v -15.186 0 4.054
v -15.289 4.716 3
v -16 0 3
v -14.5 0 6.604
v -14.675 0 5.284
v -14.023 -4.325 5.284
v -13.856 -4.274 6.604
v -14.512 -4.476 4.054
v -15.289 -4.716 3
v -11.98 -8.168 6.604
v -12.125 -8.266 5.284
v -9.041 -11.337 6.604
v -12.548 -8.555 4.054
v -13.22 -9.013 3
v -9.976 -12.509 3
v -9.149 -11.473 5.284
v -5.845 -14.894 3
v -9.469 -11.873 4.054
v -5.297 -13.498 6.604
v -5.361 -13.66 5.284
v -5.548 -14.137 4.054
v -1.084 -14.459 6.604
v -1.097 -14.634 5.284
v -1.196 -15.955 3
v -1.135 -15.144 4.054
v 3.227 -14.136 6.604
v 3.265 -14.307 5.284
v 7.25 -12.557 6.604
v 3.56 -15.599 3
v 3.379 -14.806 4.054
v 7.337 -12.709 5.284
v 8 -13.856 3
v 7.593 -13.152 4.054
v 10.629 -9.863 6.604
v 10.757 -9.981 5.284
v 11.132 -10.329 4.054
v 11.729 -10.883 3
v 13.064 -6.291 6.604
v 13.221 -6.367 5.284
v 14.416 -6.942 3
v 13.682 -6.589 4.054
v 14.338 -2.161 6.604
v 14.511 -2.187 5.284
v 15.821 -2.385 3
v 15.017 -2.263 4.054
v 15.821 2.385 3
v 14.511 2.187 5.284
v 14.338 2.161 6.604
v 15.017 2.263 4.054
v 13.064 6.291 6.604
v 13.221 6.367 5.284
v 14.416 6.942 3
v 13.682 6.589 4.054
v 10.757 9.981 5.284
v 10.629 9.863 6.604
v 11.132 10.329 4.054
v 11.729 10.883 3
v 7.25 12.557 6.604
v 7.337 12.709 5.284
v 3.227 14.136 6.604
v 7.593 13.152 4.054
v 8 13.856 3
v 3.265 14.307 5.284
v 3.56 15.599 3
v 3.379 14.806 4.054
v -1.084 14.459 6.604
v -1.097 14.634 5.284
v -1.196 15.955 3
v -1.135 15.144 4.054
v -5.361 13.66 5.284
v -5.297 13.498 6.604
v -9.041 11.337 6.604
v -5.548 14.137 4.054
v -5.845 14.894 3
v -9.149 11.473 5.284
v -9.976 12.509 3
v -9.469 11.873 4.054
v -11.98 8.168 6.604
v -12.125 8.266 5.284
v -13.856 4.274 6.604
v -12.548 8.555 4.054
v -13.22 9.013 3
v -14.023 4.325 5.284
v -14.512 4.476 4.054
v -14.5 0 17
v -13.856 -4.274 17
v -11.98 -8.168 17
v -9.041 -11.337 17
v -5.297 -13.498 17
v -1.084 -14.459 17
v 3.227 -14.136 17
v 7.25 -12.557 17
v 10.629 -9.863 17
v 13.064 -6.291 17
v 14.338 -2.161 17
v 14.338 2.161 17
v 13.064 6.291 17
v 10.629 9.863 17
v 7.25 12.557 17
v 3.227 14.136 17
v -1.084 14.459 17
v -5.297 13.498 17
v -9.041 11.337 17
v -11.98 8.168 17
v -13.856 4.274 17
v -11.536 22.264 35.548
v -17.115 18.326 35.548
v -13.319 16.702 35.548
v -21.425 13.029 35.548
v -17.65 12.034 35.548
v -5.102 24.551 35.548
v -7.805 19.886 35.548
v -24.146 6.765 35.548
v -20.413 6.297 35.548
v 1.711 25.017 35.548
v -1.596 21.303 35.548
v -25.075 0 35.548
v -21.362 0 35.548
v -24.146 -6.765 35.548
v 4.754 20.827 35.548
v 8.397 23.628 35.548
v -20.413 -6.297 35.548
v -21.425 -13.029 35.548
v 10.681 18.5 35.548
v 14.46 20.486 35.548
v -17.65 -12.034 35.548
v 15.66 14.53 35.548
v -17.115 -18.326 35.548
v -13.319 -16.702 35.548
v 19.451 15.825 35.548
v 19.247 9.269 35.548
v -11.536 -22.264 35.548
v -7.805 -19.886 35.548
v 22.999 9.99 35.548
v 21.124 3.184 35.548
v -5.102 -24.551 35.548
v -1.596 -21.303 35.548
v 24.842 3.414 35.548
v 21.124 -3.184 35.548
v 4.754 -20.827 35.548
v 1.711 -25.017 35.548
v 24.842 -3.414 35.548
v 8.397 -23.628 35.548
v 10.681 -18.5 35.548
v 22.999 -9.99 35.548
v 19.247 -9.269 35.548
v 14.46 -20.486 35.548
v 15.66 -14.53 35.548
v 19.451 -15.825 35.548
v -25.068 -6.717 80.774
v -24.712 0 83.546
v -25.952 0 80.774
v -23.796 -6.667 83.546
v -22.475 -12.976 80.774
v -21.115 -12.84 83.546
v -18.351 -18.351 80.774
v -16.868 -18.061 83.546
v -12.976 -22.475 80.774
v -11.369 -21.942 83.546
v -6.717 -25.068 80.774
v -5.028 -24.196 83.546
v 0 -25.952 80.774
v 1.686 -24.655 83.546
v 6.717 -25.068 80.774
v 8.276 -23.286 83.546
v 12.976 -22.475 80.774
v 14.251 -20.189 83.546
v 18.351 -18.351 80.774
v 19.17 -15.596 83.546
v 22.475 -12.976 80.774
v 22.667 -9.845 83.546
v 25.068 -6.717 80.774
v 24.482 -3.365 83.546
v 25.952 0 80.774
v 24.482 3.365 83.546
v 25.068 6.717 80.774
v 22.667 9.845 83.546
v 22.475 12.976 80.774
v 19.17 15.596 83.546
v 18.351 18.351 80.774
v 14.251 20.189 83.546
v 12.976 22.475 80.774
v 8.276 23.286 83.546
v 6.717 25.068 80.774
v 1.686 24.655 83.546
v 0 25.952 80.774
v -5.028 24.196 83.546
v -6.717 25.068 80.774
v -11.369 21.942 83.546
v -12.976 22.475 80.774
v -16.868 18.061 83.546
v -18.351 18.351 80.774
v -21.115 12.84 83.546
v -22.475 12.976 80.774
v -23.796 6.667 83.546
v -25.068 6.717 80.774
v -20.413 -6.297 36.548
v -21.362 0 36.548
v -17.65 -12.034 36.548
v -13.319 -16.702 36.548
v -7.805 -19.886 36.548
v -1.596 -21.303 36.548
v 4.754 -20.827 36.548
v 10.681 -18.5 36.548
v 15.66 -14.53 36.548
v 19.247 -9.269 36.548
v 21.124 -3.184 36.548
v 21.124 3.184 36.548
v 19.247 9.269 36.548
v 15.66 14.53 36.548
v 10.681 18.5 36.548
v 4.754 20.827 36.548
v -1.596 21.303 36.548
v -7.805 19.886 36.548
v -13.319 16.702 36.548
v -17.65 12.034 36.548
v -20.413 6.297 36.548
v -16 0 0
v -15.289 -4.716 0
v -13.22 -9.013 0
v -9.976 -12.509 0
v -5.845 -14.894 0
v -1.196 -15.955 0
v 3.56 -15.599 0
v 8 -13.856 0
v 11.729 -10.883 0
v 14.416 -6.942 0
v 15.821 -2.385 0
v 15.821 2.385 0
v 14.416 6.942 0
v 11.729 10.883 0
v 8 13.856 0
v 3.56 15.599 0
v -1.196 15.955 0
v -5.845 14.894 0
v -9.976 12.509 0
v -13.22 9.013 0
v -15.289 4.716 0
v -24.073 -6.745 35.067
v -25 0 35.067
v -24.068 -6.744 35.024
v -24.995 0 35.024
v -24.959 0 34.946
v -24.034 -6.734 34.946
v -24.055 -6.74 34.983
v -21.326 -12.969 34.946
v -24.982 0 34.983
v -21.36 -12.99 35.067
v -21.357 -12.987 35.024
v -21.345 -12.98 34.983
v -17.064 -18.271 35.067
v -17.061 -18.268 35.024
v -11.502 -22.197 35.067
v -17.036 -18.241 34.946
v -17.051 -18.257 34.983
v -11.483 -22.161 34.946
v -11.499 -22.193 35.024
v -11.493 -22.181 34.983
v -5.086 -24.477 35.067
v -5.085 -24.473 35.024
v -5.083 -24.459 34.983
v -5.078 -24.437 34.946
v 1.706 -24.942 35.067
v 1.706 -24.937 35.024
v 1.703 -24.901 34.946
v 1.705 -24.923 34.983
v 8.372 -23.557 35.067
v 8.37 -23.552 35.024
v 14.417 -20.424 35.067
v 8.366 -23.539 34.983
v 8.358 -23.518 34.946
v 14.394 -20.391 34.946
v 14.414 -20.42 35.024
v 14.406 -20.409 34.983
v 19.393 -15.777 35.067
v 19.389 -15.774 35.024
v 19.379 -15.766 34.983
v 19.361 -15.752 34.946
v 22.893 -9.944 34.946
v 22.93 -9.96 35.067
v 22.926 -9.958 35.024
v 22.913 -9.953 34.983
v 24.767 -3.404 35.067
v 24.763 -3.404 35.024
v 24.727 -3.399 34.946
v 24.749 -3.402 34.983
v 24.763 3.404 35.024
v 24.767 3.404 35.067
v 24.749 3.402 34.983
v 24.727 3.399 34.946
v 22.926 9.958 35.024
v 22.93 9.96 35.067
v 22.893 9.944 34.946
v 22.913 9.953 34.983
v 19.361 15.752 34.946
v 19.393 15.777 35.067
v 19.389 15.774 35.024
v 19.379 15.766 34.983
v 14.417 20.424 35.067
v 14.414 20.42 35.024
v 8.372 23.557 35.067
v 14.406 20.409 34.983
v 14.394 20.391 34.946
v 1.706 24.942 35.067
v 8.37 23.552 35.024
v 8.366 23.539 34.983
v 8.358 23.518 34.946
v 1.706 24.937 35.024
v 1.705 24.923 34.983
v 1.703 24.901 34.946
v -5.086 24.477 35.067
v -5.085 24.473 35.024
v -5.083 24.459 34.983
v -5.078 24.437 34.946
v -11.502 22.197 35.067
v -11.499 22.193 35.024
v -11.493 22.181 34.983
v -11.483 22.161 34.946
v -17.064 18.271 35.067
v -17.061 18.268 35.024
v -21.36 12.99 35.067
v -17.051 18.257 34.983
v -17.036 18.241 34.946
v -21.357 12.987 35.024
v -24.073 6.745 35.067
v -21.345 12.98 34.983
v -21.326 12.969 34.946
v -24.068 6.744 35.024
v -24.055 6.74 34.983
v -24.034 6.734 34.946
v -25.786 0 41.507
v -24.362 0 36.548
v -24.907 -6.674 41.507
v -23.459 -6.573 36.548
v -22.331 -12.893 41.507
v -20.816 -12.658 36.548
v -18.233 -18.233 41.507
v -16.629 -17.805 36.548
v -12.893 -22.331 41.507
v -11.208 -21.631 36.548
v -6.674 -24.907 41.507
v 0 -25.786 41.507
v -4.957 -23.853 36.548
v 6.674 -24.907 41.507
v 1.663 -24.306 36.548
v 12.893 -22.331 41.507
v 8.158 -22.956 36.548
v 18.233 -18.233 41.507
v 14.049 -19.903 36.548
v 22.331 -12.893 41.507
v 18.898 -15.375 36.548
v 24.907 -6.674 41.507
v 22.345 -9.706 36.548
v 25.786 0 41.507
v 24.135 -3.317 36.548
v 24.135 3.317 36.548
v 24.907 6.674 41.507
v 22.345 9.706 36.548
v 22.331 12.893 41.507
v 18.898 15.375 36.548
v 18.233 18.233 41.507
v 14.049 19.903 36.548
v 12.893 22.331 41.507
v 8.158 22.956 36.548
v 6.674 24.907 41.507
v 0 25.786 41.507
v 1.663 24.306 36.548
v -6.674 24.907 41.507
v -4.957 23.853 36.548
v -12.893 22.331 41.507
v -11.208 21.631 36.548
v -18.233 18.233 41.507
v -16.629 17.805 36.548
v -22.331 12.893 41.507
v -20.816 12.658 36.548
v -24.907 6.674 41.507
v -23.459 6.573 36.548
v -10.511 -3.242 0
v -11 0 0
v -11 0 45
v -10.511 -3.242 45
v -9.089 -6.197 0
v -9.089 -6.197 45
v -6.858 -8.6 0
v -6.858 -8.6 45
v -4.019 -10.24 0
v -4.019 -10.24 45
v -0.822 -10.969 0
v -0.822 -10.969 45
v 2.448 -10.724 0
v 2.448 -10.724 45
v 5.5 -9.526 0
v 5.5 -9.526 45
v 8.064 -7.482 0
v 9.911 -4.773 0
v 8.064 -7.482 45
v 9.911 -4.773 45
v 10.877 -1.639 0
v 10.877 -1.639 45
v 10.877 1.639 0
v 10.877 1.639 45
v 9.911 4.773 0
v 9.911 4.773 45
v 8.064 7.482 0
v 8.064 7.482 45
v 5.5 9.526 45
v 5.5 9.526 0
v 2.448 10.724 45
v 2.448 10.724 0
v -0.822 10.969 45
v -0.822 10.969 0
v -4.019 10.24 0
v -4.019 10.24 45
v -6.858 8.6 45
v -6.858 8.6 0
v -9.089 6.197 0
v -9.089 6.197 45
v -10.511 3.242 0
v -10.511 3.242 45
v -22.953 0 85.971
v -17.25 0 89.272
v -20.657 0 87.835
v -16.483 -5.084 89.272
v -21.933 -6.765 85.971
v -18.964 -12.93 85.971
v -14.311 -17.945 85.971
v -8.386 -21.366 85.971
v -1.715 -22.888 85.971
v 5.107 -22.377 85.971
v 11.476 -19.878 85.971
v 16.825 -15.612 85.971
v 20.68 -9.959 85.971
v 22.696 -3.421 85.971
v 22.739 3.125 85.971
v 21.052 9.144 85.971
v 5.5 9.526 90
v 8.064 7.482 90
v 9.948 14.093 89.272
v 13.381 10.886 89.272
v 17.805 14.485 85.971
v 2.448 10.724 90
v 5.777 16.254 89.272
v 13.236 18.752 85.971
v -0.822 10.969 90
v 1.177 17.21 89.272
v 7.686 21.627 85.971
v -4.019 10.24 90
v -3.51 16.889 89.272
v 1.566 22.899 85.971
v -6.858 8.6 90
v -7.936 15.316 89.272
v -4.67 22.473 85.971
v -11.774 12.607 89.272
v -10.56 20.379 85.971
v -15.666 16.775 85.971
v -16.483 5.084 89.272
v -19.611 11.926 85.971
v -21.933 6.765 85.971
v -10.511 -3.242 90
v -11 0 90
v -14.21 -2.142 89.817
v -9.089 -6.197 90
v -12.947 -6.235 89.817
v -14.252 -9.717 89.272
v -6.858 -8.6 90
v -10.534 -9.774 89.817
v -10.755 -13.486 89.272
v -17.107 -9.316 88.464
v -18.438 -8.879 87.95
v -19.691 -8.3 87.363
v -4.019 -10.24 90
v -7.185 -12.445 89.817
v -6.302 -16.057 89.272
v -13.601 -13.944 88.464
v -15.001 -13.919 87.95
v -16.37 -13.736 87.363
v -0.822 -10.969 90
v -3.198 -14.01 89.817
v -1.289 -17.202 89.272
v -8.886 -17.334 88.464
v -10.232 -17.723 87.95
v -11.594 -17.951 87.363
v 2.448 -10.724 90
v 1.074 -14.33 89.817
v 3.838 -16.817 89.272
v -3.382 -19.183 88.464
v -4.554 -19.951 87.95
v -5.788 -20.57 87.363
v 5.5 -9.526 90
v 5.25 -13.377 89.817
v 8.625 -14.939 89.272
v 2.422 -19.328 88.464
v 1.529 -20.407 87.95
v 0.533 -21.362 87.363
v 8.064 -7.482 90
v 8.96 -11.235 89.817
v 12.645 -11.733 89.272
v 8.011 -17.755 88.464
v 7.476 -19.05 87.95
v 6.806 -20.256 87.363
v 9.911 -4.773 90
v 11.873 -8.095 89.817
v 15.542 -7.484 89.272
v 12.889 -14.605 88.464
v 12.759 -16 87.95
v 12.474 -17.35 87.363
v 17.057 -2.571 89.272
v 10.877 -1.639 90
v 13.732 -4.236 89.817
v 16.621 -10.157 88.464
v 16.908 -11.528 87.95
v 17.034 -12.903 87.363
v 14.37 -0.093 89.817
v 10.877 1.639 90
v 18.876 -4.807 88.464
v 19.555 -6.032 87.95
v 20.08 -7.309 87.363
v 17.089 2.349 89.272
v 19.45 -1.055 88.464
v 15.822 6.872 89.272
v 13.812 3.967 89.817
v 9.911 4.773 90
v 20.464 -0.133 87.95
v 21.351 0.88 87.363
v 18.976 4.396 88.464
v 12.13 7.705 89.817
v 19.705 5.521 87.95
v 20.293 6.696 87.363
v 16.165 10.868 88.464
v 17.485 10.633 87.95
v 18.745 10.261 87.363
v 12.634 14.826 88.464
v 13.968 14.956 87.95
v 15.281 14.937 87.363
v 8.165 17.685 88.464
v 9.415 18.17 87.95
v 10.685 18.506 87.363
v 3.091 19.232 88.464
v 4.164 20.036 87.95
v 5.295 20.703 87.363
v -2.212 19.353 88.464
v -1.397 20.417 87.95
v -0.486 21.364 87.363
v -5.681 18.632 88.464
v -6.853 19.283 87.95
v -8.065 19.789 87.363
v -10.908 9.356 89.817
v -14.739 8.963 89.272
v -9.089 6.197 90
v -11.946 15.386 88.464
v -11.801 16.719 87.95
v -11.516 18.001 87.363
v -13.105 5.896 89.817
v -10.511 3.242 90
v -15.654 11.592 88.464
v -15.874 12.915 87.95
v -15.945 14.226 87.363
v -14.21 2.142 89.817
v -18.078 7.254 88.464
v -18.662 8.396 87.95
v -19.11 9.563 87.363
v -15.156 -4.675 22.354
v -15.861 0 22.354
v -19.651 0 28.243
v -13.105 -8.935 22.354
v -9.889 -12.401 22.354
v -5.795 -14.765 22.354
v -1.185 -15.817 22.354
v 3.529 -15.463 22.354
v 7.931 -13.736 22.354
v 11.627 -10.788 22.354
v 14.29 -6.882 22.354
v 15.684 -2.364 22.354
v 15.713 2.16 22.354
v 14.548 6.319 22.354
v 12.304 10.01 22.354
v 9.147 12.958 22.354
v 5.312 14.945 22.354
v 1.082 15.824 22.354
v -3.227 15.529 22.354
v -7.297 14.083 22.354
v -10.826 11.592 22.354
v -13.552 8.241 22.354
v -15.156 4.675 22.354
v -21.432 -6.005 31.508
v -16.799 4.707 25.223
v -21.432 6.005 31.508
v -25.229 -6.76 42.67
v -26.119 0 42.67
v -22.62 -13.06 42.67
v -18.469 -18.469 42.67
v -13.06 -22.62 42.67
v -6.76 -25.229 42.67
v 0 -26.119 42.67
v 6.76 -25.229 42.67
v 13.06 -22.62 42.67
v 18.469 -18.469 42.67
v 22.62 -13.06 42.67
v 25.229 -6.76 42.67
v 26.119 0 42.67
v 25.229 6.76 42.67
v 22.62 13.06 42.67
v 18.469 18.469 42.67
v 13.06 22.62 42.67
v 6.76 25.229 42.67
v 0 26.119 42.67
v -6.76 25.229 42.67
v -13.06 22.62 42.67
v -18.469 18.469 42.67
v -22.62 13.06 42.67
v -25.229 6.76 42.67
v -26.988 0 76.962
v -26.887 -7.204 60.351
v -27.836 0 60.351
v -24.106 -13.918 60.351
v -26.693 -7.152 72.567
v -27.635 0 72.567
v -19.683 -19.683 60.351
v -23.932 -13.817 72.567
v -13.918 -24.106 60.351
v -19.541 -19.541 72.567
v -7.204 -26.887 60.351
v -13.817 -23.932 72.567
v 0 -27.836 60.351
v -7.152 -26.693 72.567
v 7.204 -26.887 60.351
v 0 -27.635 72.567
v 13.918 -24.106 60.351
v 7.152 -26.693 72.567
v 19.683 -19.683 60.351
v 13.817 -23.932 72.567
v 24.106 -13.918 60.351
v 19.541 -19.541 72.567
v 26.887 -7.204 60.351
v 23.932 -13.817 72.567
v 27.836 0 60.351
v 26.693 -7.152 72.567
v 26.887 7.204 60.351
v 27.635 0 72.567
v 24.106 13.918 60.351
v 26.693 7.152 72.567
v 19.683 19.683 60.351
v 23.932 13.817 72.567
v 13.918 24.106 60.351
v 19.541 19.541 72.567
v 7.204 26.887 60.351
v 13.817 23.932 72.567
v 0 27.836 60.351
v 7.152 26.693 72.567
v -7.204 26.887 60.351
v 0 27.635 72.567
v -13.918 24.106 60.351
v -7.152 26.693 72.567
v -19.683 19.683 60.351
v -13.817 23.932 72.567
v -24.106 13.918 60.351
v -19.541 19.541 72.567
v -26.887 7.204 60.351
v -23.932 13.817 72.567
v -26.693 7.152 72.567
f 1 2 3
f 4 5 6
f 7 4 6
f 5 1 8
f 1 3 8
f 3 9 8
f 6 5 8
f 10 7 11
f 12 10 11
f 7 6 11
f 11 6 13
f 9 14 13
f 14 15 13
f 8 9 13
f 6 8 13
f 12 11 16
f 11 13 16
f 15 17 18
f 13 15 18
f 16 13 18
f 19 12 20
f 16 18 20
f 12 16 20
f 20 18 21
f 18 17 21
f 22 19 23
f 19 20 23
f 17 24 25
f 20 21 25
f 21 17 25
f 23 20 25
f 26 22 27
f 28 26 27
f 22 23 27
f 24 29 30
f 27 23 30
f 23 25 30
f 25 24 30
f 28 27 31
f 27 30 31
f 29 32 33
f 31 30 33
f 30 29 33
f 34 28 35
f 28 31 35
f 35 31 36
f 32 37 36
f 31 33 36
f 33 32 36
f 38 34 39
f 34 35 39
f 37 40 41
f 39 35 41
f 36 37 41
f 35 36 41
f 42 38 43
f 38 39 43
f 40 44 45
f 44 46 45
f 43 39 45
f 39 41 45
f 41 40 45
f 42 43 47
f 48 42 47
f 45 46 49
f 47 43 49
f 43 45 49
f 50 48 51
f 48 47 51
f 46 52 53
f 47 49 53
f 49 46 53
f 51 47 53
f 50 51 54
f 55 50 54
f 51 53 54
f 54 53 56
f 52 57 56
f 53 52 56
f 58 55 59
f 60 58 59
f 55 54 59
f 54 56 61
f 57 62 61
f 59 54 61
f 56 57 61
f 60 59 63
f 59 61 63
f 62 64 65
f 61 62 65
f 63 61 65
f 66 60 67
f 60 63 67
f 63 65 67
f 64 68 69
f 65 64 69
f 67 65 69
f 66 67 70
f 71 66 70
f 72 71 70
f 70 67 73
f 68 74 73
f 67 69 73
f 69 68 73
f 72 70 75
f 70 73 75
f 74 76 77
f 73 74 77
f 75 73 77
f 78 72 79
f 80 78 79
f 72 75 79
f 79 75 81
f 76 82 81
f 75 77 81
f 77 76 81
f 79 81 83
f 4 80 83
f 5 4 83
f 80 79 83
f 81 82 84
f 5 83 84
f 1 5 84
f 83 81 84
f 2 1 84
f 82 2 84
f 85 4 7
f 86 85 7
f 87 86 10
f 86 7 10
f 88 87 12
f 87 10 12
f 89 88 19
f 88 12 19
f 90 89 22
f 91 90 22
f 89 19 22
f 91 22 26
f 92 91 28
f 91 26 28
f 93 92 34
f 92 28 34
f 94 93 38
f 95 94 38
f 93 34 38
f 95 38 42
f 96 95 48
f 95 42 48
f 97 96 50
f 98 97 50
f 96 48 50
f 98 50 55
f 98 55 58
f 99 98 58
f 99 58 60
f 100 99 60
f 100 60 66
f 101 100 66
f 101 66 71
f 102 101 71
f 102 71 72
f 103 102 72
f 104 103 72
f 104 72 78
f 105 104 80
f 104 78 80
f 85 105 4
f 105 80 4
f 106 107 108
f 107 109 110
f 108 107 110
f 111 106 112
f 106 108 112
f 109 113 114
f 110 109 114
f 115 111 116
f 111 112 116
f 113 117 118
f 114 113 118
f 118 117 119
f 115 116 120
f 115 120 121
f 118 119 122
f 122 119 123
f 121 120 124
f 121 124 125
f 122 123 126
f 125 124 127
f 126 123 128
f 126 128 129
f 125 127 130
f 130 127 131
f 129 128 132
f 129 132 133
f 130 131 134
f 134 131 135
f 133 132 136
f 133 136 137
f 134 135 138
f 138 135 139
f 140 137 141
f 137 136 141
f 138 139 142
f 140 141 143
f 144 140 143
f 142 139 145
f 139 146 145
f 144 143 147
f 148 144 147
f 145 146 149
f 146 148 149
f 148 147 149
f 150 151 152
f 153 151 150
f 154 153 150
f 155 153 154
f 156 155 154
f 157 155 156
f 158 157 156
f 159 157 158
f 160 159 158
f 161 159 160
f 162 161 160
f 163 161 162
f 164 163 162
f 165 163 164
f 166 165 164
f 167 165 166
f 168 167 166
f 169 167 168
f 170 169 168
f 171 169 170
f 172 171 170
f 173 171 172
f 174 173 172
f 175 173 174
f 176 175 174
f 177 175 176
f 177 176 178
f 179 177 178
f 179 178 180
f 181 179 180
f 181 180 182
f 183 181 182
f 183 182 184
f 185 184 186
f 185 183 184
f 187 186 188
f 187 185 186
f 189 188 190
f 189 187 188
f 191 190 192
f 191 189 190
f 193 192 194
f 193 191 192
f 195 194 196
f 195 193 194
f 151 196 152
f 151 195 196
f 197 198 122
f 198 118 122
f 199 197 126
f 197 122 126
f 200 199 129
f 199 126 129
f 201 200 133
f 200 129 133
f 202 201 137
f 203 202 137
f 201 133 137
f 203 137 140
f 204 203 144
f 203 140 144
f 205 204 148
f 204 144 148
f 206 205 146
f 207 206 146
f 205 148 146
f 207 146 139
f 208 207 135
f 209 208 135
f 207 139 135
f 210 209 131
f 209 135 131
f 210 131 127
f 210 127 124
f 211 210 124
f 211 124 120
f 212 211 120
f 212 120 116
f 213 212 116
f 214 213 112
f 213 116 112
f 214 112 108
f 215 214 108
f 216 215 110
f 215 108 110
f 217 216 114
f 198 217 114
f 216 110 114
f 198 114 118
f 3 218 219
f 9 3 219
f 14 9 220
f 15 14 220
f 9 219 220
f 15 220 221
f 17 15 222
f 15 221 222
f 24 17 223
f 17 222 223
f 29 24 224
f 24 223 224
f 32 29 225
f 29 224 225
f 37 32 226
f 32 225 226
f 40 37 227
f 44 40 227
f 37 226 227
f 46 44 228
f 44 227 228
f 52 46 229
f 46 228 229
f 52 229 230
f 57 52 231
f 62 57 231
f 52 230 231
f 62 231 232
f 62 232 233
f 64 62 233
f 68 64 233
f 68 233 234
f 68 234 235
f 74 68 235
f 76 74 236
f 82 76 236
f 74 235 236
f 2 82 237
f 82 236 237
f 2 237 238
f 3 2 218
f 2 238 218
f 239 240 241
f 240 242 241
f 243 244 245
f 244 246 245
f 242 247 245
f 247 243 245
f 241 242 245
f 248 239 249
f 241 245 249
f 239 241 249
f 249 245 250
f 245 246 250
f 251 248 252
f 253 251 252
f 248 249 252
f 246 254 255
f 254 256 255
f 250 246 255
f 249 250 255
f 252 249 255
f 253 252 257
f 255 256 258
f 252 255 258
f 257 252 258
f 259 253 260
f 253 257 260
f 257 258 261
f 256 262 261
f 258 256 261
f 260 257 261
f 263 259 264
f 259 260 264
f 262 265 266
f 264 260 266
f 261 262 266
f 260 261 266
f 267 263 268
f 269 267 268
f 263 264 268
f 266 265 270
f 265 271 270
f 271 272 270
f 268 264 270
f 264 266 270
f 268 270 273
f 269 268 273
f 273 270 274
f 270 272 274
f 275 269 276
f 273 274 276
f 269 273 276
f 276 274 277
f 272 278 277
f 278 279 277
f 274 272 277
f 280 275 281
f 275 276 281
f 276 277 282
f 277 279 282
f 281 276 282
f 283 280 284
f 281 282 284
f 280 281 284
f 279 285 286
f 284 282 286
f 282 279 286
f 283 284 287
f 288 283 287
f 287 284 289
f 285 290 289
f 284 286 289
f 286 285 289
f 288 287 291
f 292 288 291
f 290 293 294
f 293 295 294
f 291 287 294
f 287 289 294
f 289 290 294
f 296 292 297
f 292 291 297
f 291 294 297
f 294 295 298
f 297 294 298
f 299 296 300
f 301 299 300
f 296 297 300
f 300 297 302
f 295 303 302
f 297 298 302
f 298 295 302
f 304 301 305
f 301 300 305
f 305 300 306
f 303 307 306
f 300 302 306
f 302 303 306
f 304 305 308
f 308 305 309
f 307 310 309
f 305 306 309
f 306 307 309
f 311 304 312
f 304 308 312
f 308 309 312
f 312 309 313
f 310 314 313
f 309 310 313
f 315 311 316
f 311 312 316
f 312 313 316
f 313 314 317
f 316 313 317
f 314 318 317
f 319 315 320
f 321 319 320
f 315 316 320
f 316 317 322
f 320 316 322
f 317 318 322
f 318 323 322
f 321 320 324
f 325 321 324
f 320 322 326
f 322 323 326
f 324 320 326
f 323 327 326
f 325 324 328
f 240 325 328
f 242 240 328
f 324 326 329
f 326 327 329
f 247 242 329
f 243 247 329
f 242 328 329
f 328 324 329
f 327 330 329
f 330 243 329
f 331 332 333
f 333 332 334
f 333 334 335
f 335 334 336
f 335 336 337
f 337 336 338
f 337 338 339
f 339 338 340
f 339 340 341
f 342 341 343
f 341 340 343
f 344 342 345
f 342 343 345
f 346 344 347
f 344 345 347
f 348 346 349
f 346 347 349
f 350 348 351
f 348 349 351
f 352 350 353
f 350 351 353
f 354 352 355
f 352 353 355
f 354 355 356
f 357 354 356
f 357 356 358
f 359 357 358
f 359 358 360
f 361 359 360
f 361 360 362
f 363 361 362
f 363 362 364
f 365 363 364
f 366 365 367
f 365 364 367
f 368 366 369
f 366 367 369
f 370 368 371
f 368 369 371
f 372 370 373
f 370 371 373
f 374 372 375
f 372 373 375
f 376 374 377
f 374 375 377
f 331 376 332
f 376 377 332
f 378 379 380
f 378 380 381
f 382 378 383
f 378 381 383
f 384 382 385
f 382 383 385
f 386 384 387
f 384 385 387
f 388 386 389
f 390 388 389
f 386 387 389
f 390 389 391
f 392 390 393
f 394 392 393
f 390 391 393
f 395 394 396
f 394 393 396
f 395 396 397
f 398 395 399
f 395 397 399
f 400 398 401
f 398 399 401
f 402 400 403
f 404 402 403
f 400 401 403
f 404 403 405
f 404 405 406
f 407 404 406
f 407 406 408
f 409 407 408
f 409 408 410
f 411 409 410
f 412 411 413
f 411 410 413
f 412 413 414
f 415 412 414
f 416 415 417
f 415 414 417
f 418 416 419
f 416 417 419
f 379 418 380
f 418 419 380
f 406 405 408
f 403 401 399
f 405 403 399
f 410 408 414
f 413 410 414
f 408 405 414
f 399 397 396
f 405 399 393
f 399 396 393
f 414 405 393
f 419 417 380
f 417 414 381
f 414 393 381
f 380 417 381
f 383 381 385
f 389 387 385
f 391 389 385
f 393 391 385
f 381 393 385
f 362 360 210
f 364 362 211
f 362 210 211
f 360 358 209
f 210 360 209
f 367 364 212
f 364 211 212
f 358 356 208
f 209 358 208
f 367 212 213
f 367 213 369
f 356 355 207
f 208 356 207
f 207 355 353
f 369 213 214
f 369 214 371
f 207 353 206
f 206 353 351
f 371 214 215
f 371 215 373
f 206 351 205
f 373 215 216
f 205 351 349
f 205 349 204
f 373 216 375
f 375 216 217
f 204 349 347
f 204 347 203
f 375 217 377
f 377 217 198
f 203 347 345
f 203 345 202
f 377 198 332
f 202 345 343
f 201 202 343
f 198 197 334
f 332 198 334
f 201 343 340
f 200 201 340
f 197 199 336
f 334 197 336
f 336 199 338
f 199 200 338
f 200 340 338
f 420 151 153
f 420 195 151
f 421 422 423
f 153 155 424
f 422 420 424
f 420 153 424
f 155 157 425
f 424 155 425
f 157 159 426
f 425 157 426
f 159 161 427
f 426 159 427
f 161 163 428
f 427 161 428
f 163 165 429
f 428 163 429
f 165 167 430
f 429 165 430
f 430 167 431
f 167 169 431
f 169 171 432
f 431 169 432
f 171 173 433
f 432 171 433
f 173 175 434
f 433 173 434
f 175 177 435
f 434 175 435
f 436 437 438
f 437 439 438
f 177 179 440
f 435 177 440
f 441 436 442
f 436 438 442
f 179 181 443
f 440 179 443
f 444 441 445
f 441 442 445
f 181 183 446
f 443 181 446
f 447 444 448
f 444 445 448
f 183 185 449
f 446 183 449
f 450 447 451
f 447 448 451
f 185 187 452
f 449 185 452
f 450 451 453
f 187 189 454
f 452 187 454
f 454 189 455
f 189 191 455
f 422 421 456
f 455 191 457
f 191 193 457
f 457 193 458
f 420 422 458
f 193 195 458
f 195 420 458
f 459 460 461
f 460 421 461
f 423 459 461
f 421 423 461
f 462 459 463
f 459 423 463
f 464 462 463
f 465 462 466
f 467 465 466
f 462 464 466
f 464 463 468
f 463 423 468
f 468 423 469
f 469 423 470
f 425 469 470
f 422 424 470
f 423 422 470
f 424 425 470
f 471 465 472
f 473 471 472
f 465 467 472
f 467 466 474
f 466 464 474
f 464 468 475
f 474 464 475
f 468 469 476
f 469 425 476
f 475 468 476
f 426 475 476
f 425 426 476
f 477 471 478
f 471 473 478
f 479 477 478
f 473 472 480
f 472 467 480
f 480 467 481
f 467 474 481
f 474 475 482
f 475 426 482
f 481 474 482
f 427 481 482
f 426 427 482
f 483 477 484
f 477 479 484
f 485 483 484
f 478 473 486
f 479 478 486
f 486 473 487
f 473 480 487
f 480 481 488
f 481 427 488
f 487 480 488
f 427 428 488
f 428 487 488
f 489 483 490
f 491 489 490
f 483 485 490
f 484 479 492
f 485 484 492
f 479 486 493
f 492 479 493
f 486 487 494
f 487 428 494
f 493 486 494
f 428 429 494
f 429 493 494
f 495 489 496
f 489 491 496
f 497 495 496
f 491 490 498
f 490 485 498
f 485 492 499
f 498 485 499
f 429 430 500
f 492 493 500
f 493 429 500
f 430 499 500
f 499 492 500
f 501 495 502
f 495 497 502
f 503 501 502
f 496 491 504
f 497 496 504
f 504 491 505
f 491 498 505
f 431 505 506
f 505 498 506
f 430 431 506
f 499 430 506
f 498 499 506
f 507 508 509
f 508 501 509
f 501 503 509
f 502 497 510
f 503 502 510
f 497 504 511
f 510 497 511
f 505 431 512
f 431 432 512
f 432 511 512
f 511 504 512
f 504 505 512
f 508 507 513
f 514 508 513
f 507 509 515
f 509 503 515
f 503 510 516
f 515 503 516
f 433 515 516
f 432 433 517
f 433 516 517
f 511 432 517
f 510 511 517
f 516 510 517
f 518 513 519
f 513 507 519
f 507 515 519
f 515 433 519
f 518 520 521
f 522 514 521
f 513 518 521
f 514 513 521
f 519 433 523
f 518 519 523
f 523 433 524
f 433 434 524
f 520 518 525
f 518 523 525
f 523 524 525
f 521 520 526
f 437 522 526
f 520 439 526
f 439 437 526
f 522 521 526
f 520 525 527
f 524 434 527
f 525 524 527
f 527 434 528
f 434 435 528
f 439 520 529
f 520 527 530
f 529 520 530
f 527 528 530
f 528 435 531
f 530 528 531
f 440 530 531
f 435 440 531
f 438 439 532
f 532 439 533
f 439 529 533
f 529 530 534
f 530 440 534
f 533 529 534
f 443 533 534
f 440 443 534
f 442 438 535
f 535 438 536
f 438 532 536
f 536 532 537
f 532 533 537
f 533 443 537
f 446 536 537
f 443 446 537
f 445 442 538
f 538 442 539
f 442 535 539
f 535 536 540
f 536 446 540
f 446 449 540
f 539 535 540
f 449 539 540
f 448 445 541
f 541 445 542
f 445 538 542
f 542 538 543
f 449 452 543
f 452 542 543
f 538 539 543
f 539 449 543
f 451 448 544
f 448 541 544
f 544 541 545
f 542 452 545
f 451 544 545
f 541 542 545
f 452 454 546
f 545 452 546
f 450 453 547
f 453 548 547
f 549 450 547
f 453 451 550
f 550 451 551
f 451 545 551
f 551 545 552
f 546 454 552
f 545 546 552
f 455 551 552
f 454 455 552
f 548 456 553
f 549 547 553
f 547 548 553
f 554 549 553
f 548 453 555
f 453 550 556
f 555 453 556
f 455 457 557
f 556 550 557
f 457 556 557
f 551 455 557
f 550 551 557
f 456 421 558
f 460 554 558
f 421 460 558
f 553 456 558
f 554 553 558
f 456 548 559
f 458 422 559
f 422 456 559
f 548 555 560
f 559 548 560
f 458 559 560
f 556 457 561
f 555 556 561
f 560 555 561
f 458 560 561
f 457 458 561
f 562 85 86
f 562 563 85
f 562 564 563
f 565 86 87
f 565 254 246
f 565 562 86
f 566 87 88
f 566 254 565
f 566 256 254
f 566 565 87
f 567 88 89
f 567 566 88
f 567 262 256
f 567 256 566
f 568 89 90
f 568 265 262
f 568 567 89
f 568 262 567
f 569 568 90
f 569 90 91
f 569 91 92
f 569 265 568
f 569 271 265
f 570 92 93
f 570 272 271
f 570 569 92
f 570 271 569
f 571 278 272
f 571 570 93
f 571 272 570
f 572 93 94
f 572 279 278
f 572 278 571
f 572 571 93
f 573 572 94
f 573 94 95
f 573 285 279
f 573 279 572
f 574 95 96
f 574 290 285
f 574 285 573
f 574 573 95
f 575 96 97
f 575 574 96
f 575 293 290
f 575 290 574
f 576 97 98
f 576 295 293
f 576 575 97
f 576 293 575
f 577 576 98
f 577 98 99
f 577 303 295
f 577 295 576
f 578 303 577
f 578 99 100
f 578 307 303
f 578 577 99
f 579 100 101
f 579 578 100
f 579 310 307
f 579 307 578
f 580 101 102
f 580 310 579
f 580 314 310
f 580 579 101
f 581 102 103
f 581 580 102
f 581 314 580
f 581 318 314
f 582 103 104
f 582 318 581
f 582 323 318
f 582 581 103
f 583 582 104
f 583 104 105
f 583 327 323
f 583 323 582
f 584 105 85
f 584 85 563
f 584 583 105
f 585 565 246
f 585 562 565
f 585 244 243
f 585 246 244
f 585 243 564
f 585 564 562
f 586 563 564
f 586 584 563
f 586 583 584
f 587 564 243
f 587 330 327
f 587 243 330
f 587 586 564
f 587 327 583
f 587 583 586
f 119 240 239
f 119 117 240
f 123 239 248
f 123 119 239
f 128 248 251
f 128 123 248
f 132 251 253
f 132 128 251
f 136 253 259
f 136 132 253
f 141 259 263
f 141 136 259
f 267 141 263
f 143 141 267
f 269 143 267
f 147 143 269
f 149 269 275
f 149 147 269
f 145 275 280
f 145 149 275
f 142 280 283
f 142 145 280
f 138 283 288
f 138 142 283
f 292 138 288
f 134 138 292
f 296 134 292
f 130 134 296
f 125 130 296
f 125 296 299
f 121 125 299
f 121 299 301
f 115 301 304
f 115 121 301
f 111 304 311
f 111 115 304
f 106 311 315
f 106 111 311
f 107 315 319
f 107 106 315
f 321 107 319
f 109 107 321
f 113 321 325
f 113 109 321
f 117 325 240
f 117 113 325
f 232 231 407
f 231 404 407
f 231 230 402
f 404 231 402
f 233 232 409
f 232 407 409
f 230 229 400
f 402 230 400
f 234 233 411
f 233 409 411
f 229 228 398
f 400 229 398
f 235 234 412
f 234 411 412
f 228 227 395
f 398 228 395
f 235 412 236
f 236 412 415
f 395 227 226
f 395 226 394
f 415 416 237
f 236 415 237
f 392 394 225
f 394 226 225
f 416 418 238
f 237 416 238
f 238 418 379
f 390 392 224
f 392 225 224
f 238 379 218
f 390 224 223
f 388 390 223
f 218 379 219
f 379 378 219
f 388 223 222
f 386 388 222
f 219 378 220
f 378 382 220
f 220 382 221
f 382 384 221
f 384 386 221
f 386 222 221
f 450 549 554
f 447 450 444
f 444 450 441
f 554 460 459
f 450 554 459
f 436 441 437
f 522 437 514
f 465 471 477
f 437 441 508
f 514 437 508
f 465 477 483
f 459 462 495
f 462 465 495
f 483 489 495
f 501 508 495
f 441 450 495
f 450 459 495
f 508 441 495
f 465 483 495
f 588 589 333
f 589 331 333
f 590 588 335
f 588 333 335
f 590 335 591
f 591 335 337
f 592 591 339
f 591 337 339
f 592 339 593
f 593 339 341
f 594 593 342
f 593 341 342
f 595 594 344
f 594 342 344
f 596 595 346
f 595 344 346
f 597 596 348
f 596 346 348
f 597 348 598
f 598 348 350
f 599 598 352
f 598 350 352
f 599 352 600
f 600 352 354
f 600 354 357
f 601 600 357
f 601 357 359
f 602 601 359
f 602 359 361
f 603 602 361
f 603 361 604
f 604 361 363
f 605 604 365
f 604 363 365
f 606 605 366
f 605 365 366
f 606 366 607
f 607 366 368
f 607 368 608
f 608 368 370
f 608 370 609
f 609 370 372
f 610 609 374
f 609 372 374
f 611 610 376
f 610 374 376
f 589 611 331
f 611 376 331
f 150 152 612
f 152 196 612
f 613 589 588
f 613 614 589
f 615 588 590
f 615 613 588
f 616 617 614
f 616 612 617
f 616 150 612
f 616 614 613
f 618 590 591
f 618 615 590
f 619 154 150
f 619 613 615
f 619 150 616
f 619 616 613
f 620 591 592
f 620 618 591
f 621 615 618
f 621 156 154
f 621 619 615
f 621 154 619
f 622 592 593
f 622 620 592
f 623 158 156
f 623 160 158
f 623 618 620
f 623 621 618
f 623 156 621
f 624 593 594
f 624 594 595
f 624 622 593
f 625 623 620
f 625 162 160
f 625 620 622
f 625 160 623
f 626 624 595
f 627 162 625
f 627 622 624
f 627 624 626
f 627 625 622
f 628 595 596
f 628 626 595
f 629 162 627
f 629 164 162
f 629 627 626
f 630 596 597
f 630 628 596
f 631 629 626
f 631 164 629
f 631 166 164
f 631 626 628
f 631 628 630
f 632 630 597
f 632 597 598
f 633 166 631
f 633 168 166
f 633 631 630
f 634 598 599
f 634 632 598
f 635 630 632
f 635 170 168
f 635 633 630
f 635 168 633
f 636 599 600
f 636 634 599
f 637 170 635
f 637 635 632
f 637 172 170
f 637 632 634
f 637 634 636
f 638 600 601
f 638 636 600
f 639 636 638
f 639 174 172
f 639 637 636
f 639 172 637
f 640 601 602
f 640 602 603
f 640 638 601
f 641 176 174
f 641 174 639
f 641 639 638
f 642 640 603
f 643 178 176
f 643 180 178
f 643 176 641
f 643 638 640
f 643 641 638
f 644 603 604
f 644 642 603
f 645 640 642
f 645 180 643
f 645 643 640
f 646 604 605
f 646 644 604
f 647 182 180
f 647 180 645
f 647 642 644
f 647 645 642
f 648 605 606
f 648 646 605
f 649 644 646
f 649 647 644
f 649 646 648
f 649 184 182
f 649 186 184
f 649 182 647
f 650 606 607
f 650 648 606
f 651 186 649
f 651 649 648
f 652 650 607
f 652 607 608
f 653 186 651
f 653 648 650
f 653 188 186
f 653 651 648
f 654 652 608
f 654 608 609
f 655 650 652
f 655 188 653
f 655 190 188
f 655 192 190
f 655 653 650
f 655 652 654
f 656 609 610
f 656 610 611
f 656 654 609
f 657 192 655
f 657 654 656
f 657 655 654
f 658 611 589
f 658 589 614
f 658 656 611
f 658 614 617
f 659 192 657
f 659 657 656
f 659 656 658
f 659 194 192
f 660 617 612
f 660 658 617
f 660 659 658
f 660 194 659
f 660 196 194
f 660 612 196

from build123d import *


# Not quite as in the source:
# - a fillet or chamfer that OpenCascade refuses, or shapes differently, is made with other operations: its cross-section is extruded or revolved along the edge and cut away or added


with BuildPart() as f1:
    # F0 (on Front) → F1 (revolve)
    with BuildSketch(Plane.XZ):
        with BuildLine():
            Line((-16, 3), (-16, 0))
            Line((-16, 0), (-11, 0))
            Line((-11, 0), (-11, 45))
            Line((-11, 45), (0, 45))
            Line((0, 45), (0, 90))
            Line((0, 90), (-11, 90))
            add(Edge.make_bspline(
                [(-11, 90), (-18.2598325737, 90), (-22.3191203043, 87.7987933146), (-24.7124240869, 83.5464183412)],
                knots=[0, 0, 0, 0, 0.3193219477, 0.3193219477, 0.3193219477, 0.3193219477], degree=3))
            add(Edge.make_bspline(
                [(-25.95214754, 80.7744236544), (-25.5955388267, 81.7789820937), (-25.1863115013, 82.7032707784), (-24.7124240769, 83.5464183618)],
                knots=[0.6173140508, 0.6173140508, 0.6173140508, 0.6173140508, 0.6804824316, 0.6804824316, 0.6804824316, 0.6804824316], degree=3))
            add(Edge.make_bspline(
                [(-25.95214754, 80.7744236544), (-29.013744824, 72.1320741786), (-28.1040669162, 57.593769762), (-25.7856152344, 41.5069436394)],
                knots=[0.3826740582, 0.3826740582, 0.3826740582, 0.3826740582, 0.9280294048, 0.9280294048, 0.9280294048, 0.9280294048], degree=3))
            Line((-25.7856152343, 41.5069436384), (-24.3623662292, 36.5477789253))
            Line((-24.3623662292, 36.5477789253), (-21.3623662292, 36.5477789253))
            Line((-21.3623662292, 36.5477789253), (-21.3623662292, 35.5477789253))
            Line((-21.3623662292, 35.5477789253), (-24.0753725342, 35.5477789253))
            Line((-24.0753725342, 35.5477789253), (-24.8771885438, 35.5477789253))
            Line((-24.8771885438, 35.5477789253), (-25.0753725342, 35.5477789253))
            add(Edge.make_bspline(
                [(-25, 35.0670883895), (-25.0252278751, 35.22739015), (-25.0503528609, 35.3876218128), (-25.0753725342, 35.5477789253)],
                knots=[0, 0, 0, 0, 0.0053759457, 0.0053759457, 0.0053759457, 0.0053759457], degree=3))
            ThreePointArc((-25, 35.0670883895), (-24.9896036739, 35.0034452685), (-24.9594955315, 34.9464186939))
            add(Edge.make_bspline(
                [(-14.5, 17), (-15.0136726081, 20.8512590653), (-16.9742007652, 25.4036532302), (-22.365796569, 31.5181893252), (-24.9594955315, 34.9464186939)],
                knots=[0, 0, 0, 0, 0.461922101, 0.9972118566, 0.9972118566, 0.9972118566, 0.9972118566], degree=3))
            Line((-14.5, 17), (-14.5, 3))
            Line((-14.5, 3), (-16, 3))
        make_face()
        with BuildLine():
            add(Edge.make_bspline(
                [(-25.95214754, 80.7744236544), (-29.013744824, 72.1320741786), (-28.1040669162, 57.593769762), (-25.7856152344, 41.5069436394)],
                knots=[0.3826740582, 0.3826740582, 0.3826740582, 0.3826740582, 0.9280294048, 0.9280294048, 0.9280294048, 0.9280294048], degree=3))
            add(Edge.make_bspline(
                [(-26.119291441, 42.669604047), (-28.2279288517, 58.1855295549), (-28.9528077457, 72.3216337444), (-25.95214754, 80.7744236544)],
                knots=[0.0857879305, 0.0857879305, 0.0857879305, 0.0857879305, 0.6173140508, 0.6173140508, 0.6173140508, 0.6173140508], degree=3))
            Line((-26.119291441, 42.669604047), (-25.7856152343, 41.5069436384))
        make_face()
    revolve(axis=Axis((0, 0, 41.293862511), (0, 0, 1)))

    # F2: fillet of radius 5.08 on 1 edges, made by hand

    # F2_s1 → F2_t2 (revolve)
    with BuildSketch(Plane.XZ):
        with BuildLine():
            ThreePointArc((-14.5, 6.6041642582), (-14.8899680172, 4.6522421286), (-16, 3))
            Line((-16, 3), (-14.5, 3))
            Line((-14.5, 3), (-14.5, 6.6041642582))
        make_face()
    revolve(axis=Axis((0, 0, 3), (0, 0, 1)))


solid = f1.part
